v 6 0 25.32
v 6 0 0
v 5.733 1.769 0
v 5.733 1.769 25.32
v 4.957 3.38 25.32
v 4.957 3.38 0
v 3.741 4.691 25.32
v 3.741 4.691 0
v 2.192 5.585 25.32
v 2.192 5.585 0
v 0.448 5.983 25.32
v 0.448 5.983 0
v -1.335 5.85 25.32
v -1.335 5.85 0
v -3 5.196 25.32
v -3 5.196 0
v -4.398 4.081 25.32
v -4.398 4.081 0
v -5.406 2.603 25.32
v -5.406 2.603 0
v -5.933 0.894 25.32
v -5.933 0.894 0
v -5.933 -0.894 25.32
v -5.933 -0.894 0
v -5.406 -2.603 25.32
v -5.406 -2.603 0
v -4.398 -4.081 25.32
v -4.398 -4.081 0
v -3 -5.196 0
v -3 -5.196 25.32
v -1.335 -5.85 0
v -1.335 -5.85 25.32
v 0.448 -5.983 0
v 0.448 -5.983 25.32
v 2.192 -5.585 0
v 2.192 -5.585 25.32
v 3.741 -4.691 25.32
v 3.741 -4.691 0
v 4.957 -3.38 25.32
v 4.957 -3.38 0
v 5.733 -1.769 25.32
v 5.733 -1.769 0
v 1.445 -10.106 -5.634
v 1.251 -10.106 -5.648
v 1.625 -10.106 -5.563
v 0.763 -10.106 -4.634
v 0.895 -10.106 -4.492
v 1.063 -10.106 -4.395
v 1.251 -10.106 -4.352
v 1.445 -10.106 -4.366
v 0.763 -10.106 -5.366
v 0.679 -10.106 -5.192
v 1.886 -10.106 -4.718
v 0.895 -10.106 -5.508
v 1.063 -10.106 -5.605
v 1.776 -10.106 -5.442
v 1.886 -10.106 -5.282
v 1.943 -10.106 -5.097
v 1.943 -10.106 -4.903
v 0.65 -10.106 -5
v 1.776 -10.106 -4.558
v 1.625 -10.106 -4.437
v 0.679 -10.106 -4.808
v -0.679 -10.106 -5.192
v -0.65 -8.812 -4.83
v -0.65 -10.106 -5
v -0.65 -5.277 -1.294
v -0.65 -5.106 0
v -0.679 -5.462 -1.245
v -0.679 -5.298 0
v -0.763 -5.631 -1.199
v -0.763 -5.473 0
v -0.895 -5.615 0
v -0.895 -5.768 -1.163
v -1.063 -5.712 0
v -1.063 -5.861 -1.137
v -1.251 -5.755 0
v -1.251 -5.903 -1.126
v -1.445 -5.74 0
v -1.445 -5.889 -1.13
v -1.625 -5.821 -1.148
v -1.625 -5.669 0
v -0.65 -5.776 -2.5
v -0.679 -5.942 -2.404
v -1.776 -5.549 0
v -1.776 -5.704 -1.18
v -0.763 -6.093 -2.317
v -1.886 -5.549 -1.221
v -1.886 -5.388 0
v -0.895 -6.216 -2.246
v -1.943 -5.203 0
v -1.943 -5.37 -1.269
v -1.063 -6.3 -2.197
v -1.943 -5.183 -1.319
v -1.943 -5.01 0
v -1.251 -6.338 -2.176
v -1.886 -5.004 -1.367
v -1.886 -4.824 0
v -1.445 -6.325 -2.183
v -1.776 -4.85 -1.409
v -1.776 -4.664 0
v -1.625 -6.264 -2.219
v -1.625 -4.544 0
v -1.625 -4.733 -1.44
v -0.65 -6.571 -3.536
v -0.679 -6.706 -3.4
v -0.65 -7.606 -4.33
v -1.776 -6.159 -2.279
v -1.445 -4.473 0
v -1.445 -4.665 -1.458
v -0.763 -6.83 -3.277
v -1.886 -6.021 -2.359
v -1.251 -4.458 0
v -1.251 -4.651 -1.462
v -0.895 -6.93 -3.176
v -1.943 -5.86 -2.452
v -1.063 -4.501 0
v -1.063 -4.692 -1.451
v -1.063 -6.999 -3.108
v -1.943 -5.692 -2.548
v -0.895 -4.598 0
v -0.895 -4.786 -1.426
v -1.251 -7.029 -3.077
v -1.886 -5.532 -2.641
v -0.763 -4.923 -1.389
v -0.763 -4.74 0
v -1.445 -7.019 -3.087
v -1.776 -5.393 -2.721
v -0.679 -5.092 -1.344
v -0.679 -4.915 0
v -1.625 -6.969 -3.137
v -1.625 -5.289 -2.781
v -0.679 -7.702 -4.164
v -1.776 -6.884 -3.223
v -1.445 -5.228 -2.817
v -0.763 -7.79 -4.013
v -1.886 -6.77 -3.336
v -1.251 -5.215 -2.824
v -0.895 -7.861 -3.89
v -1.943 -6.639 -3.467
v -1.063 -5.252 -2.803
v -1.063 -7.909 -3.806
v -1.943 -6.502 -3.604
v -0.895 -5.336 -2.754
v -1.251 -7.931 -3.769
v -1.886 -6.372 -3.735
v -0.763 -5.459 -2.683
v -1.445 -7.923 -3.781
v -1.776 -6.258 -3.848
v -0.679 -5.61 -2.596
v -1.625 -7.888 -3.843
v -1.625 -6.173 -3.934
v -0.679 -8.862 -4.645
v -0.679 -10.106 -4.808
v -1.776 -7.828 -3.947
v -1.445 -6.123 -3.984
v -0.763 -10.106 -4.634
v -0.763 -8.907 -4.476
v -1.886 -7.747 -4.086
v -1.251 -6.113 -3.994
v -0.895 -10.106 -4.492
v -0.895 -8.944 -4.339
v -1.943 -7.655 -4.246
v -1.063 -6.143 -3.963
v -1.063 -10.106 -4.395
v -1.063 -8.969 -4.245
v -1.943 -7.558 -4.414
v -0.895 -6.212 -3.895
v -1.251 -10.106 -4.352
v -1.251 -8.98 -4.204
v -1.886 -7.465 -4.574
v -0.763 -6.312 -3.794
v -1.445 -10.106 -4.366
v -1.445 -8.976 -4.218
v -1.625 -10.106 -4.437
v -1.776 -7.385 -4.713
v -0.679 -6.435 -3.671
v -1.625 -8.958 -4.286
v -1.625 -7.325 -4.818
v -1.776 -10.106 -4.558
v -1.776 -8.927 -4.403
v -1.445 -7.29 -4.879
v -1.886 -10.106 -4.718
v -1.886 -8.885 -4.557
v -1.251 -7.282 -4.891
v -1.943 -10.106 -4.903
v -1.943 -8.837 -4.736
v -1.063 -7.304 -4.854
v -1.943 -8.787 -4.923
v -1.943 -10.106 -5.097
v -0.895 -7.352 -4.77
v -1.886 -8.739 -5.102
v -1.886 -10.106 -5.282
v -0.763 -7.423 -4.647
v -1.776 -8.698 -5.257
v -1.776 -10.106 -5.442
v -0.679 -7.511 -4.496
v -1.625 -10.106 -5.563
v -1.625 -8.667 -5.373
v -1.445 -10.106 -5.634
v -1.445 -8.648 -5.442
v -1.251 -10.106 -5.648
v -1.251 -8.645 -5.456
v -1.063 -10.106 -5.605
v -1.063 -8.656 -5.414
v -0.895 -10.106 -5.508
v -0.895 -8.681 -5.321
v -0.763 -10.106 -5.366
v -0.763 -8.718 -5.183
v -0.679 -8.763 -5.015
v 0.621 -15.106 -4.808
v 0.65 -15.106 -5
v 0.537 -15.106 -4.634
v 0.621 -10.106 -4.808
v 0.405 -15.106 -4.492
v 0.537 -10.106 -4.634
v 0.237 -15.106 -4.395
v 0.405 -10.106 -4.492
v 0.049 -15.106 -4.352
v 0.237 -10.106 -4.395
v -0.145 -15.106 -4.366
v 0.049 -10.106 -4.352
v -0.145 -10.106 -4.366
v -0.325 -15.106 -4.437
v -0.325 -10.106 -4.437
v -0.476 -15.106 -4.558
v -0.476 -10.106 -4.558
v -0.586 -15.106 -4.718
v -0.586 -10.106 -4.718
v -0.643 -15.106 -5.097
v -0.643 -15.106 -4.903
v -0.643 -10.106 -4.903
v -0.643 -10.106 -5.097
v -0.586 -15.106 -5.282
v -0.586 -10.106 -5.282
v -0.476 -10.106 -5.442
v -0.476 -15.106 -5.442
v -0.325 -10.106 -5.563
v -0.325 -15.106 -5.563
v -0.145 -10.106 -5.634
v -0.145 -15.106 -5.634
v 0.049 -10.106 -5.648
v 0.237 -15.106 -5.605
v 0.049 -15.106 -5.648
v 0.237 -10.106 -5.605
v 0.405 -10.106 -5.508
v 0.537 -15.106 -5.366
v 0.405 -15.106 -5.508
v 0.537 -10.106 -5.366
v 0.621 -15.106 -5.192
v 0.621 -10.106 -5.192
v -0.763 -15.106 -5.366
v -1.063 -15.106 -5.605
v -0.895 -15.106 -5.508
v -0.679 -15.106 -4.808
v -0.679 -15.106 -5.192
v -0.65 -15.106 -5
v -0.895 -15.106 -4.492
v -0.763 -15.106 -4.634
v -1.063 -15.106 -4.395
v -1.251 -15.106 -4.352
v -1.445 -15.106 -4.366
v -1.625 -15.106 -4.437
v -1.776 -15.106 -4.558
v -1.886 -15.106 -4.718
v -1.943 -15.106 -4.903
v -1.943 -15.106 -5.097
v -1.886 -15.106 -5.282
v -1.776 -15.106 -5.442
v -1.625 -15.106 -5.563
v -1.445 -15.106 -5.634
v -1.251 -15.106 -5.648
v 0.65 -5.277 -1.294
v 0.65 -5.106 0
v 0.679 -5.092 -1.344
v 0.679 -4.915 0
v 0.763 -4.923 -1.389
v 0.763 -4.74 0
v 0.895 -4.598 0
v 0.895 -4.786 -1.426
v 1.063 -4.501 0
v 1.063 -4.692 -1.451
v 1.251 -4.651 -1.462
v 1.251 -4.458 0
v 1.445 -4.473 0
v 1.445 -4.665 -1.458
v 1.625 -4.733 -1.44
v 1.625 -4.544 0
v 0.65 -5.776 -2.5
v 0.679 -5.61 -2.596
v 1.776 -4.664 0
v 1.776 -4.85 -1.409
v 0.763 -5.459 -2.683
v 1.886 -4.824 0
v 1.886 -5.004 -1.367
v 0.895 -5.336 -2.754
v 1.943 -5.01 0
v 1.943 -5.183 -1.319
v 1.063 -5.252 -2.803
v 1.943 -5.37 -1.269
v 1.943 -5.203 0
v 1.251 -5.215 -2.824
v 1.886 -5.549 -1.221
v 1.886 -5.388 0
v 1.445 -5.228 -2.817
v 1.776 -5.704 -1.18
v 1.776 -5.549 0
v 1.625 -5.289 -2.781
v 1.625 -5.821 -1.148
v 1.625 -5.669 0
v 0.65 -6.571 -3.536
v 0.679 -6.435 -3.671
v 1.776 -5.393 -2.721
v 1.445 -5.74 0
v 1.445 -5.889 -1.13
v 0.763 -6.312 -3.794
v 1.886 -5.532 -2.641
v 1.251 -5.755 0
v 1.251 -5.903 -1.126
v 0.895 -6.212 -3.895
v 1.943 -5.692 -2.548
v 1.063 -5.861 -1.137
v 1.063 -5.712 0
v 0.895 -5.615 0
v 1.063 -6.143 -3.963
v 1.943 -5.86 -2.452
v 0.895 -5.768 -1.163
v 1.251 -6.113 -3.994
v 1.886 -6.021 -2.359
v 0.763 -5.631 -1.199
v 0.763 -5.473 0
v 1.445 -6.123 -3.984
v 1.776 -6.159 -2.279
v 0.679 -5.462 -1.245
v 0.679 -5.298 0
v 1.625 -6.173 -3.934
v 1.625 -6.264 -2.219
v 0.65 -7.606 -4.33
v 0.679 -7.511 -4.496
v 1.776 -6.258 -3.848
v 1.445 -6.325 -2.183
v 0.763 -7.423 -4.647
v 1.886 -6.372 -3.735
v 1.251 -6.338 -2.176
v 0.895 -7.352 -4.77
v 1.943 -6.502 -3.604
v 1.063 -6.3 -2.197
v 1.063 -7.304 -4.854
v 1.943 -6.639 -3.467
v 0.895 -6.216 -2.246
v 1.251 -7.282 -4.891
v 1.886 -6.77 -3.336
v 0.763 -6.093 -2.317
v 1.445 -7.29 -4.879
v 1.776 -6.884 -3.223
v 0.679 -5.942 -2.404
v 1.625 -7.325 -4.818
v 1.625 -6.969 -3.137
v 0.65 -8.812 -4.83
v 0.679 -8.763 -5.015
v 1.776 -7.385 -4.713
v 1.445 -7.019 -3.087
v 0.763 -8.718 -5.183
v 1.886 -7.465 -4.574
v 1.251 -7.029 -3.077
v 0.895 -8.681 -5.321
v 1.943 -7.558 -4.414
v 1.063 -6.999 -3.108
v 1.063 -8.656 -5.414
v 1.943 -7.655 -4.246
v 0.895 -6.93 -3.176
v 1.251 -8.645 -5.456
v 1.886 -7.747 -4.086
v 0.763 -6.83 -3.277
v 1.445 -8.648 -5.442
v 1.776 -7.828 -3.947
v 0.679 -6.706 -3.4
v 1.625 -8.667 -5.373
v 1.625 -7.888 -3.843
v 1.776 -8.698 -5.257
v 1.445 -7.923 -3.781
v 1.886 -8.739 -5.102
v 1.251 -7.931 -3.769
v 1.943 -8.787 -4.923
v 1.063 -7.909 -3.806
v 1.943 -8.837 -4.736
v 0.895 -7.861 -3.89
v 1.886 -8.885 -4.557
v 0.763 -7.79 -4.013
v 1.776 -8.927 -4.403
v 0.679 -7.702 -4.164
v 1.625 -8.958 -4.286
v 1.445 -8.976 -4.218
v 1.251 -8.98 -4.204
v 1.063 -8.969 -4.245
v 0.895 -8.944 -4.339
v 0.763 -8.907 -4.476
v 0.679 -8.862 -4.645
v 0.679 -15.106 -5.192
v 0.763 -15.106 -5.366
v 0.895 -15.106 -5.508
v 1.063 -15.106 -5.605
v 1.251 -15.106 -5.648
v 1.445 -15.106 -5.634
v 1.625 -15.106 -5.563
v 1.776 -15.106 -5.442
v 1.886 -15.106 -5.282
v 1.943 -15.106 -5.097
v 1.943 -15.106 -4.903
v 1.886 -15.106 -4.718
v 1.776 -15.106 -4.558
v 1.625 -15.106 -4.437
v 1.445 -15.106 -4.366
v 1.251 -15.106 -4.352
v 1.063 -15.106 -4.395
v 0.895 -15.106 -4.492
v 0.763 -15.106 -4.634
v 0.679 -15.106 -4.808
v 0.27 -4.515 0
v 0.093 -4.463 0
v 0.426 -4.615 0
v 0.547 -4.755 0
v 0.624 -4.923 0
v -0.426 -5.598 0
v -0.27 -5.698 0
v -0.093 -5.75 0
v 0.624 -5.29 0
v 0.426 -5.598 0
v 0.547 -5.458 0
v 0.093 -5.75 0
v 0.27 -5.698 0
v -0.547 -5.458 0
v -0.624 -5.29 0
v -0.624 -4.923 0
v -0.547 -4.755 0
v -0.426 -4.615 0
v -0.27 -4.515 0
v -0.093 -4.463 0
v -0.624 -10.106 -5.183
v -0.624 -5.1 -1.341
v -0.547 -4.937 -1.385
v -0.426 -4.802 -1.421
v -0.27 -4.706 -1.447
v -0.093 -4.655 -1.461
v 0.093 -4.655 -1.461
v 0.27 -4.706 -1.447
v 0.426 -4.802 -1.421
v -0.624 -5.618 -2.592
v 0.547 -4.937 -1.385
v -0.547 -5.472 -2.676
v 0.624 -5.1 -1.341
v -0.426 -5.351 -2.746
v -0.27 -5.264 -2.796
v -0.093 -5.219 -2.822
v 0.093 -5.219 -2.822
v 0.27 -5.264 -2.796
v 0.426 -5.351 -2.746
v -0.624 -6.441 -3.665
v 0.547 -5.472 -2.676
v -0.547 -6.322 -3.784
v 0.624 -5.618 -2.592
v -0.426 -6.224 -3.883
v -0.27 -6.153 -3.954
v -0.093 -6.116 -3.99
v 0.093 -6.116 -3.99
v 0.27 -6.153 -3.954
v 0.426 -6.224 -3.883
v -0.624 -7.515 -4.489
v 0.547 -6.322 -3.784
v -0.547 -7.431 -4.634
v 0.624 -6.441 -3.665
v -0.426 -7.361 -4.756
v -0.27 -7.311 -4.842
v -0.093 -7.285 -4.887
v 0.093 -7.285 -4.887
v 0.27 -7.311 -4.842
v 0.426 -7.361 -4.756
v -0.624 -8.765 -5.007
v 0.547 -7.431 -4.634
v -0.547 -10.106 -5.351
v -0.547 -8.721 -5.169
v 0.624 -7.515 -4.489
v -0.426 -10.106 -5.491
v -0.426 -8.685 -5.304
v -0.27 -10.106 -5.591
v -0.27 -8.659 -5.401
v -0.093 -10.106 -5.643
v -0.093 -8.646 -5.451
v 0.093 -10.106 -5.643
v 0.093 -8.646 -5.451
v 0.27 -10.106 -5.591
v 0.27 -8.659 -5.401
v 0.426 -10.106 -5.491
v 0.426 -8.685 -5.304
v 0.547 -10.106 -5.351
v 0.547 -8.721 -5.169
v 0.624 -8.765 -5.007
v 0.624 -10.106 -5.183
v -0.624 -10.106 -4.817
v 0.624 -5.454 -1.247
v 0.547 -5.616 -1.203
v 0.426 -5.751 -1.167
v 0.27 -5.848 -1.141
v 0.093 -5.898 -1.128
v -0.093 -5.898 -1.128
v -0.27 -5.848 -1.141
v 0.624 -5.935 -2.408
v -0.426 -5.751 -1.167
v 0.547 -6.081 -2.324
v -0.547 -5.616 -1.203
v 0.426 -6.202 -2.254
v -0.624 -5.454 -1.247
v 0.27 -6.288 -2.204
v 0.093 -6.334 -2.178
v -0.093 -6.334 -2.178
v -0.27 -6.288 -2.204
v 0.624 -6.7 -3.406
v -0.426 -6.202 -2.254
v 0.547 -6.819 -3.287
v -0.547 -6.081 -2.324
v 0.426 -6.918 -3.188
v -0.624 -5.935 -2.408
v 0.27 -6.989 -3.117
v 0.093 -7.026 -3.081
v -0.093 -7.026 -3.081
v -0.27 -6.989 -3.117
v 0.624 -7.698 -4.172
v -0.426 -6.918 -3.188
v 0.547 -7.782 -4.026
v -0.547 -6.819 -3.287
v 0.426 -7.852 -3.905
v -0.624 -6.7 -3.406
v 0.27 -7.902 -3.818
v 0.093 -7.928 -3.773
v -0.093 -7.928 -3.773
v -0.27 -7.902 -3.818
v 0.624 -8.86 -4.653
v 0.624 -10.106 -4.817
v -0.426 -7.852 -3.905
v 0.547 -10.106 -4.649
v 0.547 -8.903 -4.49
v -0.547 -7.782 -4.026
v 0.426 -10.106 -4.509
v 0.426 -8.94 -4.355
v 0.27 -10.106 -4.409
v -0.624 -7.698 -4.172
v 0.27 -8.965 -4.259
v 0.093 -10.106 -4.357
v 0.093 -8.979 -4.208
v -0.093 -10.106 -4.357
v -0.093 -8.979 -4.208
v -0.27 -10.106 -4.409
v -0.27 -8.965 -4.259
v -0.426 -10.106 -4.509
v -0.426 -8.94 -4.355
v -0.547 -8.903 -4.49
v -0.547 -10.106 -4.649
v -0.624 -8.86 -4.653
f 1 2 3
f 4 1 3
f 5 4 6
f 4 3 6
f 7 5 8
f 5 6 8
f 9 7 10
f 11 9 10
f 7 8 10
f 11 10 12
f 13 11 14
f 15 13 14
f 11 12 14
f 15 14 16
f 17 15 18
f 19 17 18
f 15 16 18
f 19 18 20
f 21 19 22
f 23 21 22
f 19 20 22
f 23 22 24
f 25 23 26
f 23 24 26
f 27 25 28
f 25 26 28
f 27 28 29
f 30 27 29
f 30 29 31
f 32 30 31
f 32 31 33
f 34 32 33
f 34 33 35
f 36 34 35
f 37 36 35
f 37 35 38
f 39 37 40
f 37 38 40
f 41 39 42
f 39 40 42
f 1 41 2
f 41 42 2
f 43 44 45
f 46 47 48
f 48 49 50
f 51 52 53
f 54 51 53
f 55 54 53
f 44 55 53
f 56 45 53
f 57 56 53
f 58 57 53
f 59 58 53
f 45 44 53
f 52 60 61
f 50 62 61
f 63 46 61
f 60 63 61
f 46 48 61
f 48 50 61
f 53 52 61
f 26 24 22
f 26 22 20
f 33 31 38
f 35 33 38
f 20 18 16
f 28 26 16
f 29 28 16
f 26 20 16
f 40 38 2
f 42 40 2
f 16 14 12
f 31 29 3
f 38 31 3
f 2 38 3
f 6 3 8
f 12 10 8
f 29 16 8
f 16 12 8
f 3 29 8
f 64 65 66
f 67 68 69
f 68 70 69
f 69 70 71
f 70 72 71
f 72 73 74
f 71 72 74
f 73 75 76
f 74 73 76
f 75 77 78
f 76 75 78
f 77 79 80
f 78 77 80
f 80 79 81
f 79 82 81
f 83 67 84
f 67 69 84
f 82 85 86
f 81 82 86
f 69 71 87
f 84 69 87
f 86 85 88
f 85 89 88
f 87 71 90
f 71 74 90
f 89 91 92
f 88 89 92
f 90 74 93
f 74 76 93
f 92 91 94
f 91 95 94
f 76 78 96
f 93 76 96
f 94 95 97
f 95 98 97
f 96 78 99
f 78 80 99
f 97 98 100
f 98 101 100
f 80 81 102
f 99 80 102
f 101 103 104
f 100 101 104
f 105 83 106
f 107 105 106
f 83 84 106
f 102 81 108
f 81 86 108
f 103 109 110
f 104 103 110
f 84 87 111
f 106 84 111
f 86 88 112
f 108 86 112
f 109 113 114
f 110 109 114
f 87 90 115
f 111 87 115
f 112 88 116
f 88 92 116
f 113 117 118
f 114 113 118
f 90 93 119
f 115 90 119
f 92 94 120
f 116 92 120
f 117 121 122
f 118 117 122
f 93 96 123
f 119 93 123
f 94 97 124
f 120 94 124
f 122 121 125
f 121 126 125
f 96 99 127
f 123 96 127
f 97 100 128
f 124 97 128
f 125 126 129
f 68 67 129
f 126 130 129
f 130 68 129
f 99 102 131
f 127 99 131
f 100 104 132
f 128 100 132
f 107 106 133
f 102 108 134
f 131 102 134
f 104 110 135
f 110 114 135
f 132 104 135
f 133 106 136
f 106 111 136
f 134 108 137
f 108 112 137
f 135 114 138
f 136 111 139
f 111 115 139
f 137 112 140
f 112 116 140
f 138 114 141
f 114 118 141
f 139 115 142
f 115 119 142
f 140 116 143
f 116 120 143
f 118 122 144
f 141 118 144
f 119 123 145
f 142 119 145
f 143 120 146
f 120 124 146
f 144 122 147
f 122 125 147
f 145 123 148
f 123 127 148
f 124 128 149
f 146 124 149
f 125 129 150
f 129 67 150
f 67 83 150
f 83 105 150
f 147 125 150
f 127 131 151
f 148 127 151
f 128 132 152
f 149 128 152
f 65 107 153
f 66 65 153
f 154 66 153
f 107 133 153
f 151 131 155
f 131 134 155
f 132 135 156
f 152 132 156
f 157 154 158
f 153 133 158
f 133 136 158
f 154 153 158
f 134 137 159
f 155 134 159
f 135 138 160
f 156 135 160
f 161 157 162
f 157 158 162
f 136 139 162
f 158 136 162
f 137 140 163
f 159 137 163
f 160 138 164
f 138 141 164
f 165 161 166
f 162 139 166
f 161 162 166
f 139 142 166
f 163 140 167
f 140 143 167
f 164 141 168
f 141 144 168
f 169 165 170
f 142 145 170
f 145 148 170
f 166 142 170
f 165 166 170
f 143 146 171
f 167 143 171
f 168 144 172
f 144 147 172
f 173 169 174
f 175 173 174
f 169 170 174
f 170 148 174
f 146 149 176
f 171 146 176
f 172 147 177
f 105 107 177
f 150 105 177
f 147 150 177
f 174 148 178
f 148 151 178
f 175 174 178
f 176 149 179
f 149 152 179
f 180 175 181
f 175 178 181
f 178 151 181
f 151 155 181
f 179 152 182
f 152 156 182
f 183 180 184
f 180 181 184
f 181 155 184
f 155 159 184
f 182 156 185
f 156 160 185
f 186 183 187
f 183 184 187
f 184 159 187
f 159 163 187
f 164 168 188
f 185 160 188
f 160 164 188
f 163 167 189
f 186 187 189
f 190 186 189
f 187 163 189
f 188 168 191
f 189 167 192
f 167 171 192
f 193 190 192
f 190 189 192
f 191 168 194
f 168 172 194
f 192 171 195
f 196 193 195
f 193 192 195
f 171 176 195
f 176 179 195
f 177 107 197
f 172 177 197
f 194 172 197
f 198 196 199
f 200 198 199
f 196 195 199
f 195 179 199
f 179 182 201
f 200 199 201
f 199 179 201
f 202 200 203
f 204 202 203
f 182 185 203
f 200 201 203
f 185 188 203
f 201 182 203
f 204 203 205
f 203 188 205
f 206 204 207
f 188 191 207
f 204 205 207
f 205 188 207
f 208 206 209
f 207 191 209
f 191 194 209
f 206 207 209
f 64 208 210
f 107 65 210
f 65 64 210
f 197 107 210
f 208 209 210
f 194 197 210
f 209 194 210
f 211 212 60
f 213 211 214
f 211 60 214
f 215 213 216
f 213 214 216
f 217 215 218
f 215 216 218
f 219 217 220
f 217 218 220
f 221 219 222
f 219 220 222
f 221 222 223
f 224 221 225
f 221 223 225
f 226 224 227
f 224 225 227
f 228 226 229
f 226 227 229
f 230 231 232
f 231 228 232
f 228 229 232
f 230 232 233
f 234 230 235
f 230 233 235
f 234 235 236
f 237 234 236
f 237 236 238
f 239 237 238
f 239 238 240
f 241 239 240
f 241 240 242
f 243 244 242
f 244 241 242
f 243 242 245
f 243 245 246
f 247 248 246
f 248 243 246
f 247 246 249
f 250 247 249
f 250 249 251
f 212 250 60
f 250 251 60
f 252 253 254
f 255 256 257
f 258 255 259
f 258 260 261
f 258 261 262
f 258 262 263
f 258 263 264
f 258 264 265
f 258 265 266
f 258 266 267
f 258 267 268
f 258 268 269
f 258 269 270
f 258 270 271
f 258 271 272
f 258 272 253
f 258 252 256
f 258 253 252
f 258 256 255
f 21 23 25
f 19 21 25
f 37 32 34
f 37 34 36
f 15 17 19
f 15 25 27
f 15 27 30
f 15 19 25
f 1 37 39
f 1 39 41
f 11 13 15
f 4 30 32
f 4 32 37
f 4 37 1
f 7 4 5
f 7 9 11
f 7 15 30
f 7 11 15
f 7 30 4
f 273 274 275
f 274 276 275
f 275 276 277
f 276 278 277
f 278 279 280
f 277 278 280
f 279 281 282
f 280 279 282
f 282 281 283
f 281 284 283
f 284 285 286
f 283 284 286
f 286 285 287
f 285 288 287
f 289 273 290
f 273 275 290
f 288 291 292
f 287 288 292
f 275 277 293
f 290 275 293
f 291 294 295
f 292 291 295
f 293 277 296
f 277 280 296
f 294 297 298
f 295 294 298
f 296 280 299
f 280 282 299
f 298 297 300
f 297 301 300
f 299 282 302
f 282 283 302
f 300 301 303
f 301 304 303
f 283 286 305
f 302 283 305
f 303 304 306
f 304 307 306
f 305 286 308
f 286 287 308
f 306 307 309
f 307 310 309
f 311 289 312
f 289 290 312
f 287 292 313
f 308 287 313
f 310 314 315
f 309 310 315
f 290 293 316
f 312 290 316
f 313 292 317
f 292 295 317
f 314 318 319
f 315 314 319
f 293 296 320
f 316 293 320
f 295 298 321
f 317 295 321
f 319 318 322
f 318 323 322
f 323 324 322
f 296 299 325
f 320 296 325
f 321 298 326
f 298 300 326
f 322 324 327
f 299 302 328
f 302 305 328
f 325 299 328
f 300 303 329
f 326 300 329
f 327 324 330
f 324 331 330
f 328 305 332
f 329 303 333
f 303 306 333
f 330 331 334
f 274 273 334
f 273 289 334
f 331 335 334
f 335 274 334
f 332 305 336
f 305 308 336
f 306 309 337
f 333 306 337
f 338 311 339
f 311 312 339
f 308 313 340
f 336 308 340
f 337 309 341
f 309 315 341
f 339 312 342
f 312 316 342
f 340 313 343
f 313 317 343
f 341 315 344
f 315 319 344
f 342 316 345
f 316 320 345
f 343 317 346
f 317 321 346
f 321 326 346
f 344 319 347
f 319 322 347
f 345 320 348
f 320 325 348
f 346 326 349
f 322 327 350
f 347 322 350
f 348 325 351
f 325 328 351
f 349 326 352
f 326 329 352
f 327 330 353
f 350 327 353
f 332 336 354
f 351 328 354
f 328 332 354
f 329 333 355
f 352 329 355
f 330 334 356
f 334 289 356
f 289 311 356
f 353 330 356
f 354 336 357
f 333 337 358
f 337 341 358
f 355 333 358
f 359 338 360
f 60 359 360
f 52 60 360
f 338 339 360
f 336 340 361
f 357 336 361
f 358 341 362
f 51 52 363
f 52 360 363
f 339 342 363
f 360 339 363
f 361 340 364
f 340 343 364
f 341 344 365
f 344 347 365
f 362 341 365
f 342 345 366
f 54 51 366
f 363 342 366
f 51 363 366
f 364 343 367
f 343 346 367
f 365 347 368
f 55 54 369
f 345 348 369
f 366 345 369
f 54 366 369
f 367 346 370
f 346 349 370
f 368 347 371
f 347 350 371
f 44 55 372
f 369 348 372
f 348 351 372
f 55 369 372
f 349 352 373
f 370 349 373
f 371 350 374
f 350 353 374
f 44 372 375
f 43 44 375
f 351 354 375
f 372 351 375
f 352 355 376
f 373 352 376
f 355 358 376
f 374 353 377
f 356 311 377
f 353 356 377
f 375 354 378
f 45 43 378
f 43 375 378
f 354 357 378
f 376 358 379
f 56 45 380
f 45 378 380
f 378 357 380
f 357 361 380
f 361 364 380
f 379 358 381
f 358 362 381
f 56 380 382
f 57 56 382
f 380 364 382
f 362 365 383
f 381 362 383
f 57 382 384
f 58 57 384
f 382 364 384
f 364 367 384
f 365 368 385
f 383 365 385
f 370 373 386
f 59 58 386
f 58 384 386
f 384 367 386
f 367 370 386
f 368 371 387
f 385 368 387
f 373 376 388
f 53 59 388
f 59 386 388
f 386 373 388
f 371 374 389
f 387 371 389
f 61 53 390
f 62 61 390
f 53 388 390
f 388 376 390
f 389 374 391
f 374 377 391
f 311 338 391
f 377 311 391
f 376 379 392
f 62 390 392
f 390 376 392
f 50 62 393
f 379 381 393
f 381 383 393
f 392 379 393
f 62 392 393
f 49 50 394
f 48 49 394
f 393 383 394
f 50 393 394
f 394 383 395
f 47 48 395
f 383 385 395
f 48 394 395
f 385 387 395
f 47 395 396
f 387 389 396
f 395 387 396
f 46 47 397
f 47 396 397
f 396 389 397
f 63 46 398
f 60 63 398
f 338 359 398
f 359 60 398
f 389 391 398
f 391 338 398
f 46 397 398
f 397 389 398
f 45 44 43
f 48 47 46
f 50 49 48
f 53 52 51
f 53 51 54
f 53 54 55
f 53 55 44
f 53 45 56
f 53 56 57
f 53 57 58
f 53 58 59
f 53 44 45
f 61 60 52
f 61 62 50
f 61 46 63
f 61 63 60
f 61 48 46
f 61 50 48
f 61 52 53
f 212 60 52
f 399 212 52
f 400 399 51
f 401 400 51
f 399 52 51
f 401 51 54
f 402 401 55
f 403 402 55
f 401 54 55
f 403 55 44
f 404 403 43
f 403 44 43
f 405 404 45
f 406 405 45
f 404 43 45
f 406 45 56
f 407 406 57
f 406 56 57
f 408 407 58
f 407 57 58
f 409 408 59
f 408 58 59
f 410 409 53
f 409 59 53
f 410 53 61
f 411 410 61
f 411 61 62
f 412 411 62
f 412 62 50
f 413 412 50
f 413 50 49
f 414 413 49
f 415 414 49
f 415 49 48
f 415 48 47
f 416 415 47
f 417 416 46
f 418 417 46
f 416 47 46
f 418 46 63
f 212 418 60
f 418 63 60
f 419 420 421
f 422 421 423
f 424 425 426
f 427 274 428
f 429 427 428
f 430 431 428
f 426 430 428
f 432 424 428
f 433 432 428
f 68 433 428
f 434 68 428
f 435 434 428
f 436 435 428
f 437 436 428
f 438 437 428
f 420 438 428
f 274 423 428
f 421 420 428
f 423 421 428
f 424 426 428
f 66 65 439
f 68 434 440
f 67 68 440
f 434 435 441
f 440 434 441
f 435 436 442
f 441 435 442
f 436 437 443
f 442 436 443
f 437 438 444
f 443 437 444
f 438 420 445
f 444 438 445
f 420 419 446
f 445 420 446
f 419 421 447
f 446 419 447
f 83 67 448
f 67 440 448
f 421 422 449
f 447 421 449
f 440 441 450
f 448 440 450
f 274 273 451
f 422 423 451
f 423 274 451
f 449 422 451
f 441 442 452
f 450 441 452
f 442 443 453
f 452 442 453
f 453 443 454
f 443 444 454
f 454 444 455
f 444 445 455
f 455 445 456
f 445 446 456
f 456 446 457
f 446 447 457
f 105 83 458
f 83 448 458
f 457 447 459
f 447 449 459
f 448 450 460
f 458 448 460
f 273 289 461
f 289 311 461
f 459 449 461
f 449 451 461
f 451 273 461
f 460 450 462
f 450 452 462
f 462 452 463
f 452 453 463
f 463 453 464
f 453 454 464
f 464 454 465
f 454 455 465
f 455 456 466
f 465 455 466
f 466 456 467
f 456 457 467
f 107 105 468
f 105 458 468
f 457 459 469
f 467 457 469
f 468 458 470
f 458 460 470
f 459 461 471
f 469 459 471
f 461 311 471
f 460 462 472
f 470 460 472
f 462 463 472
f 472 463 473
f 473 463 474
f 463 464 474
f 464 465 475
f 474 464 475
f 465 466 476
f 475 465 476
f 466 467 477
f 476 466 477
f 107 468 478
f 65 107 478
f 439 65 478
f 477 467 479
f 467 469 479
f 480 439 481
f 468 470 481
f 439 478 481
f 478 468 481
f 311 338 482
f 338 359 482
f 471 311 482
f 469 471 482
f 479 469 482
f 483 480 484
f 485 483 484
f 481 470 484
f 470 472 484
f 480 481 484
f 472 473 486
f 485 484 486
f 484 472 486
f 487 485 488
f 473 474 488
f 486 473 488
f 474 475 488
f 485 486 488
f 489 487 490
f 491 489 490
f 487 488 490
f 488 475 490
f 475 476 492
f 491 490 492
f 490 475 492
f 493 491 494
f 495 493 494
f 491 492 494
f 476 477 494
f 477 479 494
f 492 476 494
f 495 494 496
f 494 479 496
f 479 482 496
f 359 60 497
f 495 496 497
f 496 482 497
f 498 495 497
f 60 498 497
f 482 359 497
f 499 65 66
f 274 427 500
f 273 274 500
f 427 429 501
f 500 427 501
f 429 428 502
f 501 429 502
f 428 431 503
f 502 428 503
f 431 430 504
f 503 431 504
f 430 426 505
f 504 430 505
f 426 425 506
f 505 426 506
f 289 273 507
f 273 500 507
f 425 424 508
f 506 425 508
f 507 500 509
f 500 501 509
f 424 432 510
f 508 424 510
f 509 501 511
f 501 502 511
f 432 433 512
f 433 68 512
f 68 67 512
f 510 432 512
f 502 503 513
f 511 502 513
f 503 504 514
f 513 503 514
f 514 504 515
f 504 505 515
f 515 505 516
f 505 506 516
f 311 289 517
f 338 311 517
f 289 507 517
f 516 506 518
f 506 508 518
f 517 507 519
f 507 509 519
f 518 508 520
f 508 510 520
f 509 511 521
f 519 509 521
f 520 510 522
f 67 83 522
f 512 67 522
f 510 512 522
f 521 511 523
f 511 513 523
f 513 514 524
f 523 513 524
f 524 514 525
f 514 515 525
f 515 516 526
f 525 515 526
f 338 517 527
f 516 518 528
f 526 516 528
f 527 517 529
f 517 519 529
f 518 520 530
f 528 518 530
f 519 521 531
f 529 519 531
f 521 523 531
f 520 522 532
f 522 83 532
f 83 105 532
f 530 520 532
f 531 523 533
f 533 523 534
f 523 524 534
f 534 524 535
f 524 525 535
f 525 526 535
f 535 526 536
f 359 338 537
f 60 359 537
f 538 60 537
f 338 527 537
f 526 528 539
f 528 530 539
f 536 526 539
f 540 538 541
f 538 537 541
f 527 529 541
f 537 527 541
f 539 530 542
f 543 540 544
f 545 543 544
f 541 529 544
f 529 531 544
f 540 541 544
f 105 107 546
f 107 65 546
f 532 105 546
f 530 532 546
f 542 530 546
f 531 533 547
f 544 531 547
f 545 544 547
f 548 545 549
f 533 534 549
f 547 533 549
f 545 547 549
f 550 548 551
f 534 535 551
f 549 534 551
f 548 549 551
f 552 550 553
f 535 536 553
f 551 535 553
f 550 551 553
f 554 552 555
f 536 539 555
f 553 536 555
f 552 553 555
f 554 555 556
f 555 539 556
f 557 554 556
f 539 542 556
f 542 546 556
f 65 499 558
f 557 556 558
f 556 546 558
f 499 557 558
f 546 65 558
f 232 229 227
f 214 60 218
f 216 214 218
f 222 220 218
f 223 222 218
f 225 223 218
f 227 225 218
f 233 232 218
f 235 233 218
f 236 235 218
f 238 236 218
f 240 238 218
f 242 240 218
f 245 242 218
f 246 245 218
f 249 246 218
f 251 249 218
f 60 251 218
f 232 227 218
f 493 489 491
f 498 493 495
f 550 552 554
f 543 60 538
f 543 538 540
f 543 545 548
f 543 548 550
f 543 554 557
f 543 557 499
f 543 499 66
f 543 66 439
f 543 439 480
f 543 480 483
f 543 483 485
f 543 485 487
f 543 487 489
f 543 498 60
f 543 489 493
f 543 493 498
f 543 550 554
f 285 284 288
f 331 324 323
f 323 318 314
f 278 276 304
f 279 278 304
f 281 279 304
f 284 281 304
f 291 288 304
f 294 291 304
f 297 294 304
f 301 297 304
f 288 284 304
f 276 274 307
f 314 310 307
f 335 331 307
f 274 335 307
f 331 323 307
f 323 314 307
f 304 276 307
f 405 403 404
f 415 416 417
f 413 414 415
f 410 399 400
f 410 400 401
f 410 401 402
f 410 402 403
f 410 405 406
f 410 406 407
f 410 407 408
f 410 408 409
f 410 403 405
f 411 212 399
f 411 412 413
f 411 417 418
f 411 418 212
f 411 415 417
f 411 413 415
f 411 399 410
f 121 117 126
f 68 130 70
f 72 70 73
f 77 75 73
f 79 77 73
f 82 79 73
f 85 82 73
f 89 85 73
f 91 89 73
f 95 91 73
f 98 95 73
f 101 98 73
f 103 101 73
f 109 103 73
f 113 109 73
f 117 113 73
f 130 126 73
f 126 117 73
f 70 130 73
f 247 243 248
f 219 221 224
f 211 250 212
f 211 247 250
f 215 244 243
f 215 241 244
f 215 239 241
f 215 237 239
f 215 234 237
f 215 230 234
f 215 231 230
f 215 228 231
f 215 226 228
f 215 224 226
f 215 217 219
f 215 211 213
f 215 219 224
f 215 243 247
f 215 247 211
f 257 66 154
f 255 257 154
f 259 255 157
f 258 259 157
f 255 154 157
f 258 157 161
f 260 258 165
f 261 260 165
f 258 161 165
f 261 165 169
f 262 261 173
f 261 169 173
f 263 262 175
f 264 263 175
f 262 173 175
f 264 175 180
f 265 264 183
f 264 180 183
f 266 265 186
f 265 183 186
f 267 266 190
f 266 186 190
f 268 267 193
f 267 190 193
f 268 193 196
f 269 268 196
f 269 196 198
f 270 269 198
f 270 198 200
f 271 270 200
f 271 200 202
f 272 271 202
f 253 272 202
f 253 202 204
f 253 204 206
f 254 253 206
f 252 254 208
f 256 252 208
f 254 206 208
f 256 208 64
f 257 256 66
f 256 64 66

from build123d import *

# Parameters (mm, degrees)
F0_R     = 6
F1_DEPTH = 25.32
F3_ANGLE = 90
F2_R     = 0.65
F4_DEPTH = 5
F5_DEPTH = 5
F6_DEPTH = 5


with BuildPart() as f1:
    # F0 (on Top) → F1 (new body)
    with BuildSketch(Plane.XY):
        Circle(F0_R)
    extrude(amount=F1_DEPTH)


with BuildPart() as f3:
    # F2 (on face) → F3 (revolve)
    with BuildSketch(Plane(origin=(0, 0, 0), x_dir=(1, 0, 0), z_dir=(0, 0, -1))):
        with BuildLine():
            ThreePointArc((-0.65, 5.106464261), (0, 4.456464261), (0.65, 5.106464261))
            ThreePointArc((0.65, 5.106464261), (0, 5.756464261), (-0.65, 5.106464261))
        make_face()
    revolve(axis=Axis((1.5812861521, -10.106464261, 0), (-1, 0, 0)), revolution_arc=F3_ANGLE)



with BuildPart() as f3b:
    # F2 (on face) → F3, piece 2 (revolve)
    with BuildSketch(Plane(origin=(0, 0, 0), x_dir=(1, 0, 0), z_dir=(0, 0, -1))):
        with Locations((-1.3, 5.106464261)):
            Circle(F2_R)
    revolve(axis=Axis((1.5812861521, -10.106464261, 0), (-1, 0, 0)), revolution_arc=F3_ANGLE)


with BuildPart() as f3c:
    # F2 (on face) → F3, piece 3 (revolve)
    with BuildSketch(Plane(origin=(0, 0, 0), x_dir=(1, 0, 0), z_dir=(0, 0, -1))):
        with BuildLine():
            ThreePointArc((1.95, 5.106464261), (1.3, 5.756464261), (0.65, 5.106464261))
            ThreePointArc((0.65, 5.106464261), (1.3, 4.456464261), (1.95, 5.106464261))
        make_face()
    revolve(axis=Axis((1.5812861521, -10.106464261, 0), (-1, 0, 0)), revolution_arc=F3_ANGLE)


with BuildPart() as f3_1:
    add(f3.part)
    # F4 (add): a face of the model
    f4_faces = [f3b.part.faces().sort_by_distance(p)[0] for p in [
        (-1.3, -10.106464261, -5),
    ]]

    add(f3b.part)  # F4 merges F3b
    extrude(f4_faces, amount=F4_DEPTH)


with BuildPart() as f5:
    # F5 (new): a face of the model
    f5_faces = [f3_1.part.faces().sort_by_distance(p)[0] for p in [
        (0, -10.106464261, -5),
    ]]
    extrude(f5_faces, amount=F5_DEPTH)


with BuildPart() as f6:
    # F6 (new): a face of the model
    f6_faces = [f3c.part.faces().sort_by_distance(p)[0] for p in [
        (1.3, -10.106464261, -5),
    ]]
    extrude(f6_faces, amount=F6_DEPTH)


solid = Compound([f1.part, f3c.part, f3_1.part, f5.part, f6.part])
